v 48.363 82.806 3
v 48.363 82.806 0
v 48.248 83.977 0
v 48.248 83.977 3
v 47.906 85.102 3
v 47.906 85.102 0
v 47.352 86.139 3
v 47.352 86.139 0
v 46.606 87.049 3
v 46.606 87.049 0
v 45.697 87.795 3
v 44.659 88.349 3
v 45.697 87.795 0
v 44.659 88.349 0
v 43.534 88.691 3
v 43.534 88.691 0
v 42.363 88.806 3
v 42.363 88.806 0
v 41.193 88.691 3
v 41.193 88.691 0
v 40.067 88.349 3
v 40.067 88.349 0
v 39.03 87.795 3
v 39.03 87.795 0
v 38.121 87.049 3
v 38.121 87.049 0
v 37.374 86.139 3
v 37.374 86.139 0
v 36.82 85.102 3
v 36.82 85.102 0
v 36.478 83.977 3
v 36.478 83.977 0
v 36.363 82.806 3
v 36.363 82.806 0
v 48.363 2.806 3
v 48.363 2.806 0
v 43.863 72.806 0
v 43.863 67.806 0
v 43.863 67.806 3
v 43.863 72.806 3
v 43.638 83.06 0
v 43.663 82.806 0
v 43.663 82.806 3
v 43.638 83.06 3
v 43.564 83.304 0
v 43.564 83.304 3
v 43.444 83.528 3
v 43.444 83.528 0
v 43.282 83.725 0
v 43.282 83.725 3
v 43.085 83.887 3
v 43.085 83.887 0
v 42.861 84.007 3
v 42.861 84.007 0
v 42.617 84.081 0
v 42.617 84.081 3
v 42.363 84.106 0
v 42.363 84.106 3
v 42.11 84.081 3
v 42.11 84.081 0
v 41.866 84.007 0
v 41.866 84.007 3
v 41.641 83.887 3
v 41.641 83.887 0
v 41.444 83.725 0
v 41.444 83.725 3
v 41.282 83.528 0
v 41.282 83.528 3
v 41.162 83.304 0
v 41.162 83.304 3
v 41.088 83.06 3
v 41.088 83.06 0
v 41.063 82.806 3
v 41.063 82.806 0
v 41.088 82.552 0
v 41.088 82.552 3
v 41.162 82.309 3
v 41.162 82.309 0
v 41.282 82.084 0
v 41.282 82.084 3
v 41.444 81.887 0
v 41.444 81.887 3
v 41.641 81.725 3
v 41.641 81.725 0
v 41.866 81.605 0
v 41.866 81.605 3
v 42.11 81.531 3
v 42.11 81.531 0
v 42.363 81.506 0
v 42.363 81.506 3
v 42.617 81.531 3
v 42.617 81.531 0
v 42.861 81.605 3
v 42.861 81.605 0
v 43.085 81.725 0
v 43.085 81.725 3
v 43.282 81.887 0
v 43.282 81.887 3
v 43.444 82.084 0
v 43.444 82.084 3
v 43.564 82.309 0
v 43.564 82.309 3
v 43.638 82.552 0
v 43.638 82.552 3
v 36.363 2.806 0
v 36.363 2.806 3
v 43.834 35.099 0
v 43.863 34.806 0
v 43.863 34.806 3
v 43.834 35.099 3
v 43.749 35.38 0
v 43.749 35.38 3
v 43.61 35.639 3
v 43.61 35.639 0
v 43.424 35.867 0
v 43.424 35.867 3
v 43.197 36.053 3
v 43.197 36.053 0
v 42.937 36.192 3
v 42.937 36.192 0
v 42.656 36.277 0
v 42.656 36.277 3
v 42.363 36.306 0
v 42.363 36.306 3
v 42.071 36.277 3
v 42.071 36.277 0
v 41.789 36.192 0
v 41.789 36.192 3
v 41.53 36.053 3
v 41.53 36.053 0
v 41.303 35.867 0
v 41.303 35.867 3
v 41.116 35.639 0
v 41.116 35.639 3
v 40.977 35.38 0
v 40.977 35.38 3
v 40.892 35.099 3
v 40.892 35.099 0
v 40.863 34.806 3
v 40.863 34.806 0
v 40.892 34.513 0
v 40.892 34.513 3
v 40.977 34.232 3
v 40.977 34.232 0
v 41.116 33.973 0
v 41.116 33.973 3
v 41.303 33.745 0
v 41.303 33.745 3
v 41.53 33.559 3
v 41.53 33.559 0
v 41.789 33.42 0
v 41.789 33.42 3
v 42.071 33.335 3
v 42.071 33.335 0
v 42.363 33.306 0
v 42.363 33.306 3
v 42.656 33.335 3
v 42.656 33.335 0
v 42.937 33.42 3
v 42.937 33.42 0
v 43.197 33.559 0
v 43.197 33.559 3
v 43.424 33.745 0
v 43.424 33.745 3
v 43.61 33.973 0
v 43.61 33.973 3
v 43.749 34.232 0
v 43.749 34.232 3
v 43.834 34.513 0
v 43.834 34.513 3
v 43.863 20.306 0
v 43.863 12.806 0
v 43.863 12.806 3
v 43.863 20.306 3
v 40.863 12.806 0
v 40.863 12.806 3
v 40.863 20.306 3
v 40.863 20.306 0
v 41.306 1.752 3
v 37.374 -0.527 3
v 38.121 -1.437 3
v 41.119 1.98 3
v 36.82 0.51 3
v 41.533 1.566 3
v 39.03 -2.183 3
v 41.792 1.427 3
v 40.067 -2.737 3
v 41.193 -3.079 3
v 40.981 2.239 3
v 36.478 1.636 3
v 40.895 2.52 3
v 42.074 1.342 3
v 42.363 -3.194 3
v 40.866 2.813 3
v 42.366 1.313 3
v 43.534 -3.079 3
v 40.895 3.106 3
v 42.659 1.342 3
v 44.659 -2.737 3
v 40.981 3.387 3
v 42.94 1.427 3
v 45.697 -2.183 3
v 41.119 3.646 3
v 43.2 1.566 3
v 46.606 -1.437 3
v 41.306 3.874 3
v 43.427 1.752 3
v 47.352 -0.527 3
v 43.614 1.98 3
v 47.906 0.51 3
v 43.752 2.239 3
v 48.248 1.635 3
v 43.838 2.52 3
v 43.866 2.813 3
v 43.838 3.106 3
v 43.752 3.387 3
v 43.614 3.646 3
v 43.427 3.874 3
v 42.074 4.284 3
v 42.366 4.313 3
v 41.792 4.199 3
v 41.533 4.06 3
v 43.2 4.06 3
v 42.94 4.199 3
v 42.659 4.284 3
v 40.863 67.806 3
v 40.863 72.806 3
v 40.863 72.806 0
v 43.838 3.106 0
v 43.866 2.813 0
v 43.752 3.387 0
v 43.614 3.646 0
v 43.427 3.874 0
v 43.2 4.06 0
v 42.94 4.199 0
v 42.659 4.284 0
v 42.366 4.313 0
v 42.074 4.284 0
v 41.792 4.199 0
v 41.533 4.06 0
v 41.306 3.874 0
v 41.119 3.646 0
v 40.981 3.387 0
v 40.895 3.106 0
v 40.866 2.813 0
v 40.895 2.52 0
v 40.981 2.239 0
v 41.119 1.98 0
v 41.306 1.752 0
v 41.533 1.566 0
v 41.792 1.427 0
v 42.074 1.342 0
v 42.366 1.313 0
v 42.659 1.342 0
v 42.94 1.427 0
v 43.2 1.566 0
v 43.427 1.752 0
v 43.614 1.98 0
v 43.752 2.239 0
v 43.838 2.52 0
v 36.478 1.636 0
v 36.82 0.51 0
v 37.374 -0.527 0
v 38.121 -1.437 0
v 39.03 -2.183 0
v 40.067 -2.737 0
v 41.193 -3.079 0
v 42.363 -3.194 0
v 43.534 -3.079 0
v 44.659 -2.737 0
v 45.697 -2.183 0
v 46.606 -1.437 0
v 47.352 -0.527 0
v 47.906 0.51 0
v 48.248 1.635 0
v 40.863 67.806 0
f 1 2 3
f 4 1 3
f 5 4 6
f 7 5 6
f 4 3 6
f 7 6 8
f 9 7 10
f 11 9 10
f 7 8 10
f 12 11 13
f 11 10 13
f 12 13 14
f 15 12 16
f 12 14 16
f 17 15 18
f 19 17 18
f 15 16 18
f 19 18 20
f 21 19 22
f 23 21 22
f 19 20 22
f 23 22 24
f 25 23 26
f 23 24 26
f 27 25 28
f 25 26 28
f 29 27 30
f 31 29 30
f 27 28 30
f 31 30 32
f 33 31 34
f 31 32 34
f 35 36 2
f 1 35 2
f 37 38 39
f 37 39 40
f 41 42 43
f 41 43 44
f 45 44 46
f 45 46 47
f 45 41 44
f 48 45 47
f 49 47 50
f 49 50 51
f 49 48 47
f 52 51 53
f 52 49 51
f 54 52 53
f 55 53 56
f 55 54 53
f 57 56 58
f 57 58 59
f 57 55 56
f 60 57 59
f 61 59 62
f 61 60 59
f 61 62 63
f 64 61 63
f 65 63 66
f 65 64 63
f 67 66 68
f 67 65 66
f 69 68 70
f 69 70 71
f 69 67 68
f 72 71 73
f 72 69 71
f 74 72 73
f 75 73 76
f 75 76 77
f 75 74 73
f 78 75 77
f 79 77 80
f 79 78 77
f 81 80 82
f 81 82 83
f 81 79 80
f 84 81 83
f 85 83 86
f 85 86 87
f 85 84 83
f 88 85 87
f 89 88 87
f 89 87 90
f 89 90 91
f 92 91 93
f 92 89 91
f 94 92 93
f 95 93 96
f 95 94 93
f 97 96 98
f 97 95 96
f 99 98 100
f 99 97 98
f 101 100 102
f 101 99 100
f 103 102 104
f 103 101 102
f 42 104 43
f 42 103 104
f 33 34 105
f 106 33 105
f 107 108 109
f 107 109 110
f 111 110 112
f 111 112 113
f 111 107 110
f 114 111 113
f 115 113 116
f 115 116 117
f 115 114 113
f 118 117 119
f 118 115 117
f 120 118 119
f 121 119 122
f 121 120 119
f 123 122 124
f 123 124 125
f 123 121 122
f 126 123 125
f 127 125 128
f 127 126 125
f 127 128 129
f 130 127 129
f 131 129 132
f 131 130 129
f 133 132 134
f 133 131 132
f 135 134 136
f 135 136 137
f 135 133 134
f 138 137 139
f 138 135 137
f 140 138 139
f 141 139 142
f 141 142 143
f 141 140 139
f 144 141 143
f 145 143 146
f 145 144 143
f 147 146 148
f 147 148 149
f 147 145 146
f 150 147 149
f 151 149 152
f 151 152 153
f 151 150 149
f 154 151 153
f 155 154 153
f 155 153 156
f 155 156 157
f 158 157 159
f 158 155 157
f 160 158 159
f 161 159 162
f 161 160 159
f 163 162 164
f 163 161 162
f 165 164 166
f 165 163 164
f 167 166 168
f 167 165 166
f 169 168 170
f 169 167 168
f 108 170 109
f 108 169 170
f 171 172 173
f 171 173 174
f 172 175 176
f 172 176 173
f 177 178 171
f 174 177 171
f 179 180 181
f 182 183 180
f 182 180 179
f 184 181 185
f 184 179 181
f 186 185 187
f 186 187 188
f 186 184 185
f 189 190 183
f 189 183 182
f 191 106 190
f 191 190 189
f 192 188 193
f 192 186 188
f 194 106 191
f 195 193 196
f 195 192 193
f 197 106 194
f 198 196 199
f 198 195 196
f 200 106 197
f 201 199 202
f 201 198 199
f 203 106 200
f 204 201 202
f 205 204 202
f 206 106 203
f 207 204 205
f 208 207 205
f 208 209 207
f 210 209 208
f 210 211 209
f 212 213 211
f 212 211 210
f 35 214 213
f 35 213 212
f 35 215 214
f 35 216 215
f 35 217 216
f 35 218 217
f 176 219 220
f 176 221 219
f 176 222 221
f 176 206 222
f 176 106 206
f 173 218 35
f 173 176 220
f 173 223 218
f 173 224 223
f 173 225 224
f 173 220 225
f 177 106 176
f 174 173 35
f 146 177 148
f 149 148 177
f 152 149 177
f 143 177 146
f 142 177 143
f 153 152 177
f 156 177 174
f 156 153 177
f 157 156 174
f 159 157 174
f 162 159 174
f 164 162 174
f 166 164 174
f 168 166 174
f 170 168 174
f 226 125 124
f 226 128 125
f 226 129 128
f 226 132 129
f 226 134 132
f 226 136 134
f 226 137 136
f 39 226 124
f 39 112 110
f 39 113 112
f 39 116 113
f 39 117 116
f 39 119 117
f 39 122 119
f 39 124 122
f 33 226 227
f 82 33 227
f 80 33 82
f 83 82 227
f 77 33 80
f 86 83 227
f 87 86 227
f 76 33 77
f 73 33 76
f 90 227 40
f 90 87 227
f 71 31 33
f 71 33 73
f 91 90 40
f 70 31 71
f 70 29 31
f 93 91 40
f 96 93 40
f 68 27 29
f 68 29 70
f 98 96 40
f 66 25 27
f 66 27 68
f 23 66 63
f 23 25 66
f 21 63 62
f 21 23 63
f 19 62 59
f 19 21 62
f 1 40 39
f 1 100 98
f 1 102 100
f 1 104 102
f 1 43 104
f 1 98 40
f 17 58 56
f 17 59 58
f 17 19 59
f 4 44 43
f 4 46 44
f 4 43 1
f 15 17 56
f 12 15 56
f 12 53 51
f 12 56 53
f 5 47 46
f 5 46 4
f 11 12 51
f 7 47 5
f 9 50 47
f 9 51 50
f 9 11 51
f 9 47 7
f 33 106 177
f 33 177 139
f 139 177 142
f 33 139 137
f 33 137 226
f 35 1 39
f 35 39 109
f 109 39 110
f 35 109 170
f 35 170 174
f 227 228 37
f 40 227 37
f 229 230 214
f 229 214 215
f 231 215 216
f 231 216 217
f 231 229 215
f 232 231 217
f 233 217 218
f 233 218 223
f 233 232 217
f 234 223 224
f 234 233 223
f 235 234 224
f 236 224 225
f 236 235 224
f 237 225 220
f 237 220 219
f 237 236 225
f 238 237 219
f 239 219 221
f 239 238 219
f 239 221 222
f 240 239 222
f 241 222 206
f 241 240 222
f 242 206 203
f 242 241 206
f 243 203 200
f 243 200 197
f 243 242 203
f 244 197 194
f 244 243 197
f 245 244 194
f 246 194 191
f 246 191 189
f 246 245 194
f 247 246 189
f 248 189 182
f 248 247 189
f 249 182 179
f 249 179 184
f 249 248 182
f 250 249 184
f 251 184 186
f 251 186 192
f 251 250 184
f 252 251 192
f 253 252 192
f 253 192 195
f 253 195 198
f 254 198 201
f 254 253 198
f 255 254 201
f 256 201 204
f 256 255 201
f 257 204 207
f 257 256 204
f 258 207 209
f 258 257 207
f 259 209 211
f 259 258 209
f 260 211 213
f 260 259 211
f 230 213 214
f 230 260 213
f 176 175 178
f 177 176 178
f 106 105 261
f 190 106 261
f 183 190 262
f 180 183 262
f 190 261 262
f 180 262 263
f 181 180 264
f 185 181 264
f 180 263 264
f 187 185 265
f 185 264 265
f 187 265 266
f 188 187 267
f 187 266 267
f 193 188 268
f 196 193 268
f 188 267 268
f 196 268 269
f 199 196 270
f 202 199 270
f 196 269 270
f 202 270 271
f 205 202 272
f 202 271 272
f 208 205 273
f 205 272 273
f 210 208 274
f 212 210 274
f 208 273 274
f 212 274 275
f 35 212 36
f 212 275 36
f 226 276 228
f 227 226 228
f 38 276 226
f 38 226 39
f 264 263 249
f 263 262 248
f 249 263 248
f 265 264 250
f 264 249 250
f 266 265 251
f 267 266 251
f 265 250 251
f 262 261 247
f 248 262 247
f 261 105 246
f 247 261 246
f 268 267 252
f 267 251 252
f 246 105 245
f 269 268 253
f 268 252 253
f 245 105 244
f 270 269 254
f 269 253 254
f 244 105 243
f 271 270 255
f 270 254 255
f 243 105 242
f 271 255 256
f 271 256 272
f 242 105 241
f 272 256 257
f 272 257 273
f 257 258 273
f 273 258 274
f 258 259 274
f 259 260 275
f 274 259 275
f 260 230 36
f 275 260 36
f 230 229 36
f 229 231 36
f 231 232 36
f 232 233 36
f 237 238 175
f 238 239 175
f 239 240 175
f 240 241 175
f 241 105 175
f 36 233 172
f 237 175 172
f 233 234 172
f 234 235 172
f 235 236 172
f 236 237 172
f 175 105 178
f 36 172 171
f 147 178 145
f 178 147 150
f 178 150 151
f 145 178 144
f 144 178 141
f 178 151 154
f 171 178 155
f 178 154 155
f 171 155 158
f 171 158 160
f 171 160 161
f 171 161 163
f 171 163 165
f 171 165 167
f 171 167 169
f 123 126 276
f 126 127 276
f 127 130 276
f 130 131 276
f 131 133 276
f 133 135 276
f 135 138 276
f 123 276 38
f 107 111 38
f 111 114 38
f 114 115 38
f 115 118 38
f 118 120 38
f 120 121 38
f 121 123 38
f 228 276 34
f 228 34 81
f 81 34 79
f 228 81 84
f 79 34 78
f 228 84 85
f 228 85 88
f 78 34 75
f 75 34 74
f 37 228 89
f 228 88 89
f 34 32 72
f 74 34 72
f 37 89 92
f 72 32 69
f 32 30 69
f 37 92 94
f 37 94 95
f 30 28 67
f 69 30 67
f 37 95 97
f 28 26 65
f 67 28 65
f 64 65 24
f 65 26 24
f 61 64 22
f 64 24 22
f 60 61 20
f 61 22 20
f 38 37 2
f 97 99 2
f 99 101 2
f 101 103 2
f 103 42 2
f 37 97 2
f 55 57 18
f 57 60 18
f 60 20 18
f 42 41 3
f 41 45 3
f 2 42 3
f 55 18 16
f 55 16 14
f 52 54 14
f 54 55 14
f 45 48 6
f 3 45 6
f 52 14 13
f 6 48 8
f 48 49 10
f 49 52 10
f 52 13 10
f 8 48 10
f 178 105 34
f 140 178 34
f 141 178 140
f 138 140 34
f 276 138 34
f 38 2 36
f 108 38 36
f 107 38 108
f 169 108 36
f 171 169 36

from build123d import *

# Parameters (mm, degrees)
MODEL_R             = 1.5
MODEL_R_2           = 1.299999998
MODEL_W             = 3
MODEL_H             = 5
MODEL_H_2           = 7.5
BOSS_EXTRUDE1_DEPTH = 3


with BuildPart() as part:
    # Model → Boss-Extrude1 (new body)
    with BuildSketch(Plane.XY):
        with BuildLine():
            Line((36.3632, 82.806053789), (36.3632, 2.806053789))
            ThreePointArc((36.3632, 2.806053789), (42.36315, -3.193996211), (48.3632, 2.805953789))
            Line((48.3632, 2.805953789), (48.3632, 82.806053789))
            ThreePointArc((48.3632, 82.806053789), (42.3632, 88.806053789), (36.3632, 82.806053789))
        make_face()
        with Locations((42.3632, 34.805953789)):
            Circle(MODEL_R, mode=Mode.SUBTRACT)
        with Locations((42.366358052, 2.813035516)):
            Circle(MODEL_R, mode=Mode.SUBTRACT)
        with Locations((42.3632, 82.806053789)):
            Circle(MODEL_R_2, mode=Mode.SUBTRACT)
        with Locations((42.3632, 70.306053789)):
            Rectangle(MODEL_W, MODEL_H, mode=Mode.SUBTRACT)
        with Locations((42.3632, 16.556053789)):
            Rectangle(MODEL_W, MODEL_H_2, mode=Mode.SUBTRACT)
    extrude(amount=BOSS_EXTRUDE1_DEPTH)


solid = part.part
